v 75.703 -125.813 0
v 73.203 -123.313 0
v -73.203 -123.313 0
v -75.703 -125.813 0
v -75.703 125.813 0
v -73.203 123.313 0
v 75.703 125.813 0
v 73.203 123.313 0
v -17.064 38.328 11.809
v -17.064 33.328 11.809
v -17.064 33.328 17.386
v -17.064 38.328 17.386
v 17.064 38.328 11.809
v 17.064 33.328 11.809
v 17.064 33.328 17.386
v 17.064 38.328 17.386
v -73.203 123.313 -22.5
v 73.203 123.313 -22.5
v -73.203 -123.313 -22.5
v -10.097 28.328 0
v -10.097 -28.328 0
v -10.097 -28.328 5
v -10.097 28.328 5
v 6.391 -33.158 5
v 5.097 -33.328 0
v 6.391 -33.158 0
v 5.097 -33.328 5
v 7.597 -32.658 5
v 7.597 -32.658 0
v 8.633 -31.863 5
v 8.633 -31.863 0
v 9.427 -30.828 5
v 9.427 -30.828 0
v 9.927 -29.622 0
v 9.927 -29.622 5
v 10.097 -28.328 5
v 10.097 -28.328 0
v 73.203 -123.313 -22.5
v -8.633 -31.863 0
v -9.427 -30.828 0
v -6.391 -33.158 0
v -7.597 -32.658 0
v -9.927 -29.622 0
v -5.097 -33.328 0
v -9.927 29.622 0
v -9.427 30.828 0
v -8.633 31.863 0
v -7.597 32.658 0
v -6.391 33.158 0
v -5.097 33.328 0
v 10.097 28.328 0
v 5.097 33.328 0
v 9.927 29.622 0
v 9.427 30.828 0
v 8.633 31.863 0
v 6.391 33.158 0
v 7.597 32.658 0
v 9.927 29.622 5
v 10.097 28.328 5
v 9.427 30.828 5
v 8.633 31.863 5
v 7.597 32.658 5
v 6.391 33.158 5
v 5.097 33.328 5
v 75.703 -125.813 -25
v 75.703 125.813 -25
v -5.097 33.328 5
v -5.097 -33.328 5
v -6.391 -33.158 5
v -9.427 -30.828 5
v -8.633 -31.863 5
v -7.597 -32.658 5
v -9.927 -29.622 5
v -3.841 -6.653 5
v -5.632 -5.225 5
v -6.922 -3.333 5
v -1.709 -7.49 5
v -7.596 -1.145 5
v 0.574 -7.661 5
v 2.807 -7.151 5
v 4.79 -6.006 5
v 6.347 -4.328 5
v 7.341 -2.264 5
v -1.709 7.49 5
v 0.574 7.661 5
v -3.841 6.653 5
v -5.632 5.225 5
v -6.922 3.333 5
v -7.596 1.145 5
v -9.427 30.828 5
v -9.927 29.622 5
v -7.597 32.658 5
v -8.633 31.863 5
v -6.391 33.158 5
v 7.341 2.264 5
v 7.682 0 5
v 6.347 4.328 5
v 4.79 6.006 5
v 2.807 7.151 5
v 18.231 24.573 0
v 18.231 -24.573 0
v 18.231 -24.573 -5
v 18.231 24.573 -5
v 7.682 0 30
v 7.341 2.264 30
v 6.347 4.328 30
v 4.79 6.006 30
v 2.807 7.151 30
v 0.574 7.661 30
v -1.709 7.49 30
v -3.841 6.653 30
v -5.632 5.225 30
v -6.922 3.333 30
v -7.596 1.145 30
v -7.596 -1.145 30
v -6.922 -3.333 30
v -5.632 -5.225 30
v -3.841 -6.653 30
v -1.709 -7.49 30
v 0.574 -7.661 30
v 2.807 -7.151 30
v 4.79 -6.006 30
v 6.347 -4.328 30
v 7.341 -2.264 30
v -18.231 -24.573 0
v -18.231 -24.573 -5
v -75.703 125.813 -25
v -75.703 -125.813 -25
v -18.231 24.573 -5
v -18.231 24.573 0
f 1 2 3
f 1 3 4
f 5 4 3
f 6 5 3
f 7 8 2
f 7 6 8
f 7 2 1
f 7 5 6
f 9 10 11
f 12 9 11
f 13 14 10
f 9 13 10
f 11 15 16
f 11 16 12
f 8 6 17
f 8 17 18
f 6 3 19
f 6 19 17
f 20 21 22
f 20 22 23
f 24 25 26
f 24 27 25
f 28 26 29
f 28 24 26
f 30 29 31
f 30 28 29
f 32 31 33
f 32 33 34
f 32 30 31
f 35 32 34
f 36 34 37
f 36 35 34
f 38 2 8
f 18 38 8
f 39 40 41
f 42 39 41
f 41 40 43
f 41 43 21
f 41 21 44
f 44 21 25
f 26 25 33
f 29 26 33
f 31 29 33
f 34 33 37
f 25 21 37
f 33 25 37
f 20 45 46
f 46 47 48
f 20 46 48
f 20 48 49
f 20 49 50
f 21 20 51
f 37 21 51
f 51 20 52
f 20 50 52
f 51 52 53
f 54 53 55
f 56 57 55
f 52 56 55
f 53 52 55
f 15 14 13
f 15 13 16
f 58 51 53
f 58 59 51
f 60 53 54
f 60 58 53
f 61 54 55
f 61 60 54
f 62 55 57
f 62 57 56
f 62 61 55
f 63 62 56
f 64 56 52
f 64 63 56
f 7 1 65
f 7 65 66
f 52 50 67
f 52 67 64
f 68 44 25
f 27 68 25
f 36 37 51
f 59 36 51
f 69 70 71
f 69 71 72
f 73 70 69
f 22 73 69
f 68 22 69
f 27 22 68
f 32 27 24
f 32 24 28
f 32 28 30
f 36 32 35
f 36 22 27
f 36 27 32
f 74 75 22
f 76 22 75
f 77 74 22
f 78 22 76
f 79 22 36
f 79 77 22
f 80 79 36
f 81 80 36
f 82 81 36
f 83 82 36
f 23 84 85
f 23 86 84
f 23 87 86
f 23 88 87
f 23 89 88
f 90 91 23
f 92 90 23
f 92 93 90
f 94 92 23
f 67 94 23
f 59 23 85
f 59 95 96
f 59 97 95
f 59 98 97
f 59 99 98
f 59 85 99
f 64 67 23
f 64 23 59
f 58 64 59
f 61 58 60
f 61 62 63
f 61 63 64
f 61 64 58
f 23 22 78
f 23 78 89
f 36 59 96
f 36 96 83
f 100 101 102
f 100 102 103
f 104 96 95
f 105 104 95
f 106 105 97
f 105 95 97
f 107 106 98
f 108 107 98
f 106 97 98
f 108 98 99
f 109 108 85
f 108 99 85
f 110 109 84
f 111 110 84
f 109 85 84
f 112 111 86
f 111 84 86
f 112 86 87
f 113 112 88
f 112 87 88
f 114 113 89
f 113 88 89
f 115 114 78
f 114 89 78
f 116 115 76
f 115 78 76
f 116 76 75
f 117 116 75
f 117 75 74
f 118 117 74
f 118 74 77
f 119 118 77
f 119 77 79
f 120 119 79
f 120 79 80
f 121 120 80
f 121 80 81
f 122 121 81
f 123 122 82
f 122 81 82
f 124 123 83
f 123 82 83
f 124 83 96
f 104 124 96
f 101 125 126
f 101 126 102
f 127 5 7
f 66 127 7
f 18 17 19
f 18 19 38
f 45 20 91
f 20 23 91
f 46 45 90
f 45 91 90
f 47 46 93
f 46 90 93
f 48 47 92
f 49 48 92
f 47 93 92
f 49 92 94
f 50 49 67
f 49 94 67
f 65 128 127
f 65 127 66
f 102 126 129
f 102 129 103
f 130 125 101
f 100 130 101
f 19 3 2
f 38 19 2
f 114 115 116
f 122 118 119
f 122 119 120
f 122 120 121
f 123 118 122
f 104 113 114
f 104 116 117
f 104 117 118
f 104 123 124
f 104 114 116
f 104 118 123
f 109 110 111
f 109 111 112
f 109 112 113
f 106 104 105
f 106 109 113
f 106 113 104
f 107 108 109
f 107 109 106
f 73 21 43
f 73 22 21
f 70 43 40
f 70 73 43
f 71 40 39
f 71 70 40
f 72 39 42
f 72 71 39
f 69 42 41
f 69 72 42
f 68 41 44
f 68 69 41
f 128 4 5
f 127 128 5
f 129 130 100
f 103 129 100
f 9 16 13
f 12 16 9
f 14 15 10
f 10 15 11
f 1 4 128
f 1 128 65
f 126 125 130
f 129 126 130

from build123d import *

# Parameters (mm, degrees)
F0_W      = 36.4612303674
F0_H      = 49.1461269557
F1_DEPTH  = 5
F2_W      = 20.1943330467
F2_H      = 66.6557475924
F3_DEPTH  = 5
F4_R      = 5
F5_R      = 7.6822914086
F6_DEPTH  = 25
F7_W      = 34.1282226145
F7_H      = 5.577320233
F8_DEPTH  = 5
F9_W      = 151.4060050249
F9_H      = 251.6252994537
F10_DEPTH = 25
F11_T     = -2.5


with BuildPart() as f1:
    # F0 (on Top) → F1 (new body)
    with BuildSketch(Plane.XY):
        Rectangle(F0_W, F0_H)
    extrude(amount=-F1_DEPTH)


with BuildPart() as f3:
    # F2 (on face) → F3 (new body)
    with BuildSketch(Plane.XY):
        Rectangle(F2_W, F2_H)
    extrude(amount=F3_DEPTH)

    # F4
    f4_edges = [f3.edges().sort_by_distance(p)[0] for p in [
        (-10.097167, -33.327874, 2.5),
        (10.097167, -33.327874, 2.5),
        (10.097167, 33.327874, 2.5),
        (-10.097167, 33.327874, 2.5),
    ]]
    fillet(f4_edges, radius=F4_R)

    # F5 (on face) → F6 (join)
    with BuildSketch(Plane.XY.offset(5)):
        Circle(F5_R)
    extrude(amount=F6_DEPTH)


with BuildPart() as f8:
    # F7 (on face) → F8 (new body)
    with BuildSketch(Plane(origin=(0, 33.3278737962, 0), x_dir=(-1, 0, 0), z_dir=(0, 1, 0))):
        with Locations((0, 14.5977335051)):
            Rectangle(F7_W, F7_H)
    extrude(amount=F8_DEPTH)


with BuildPart() as f10:
    # F9 (on Top) → F10 (new body)
    with BuildSketch(Plane.XY):
        Rectangle(F9_W, F9_H)
    extrude(amount=-F10_DEPTH)

    # F11
    f11_openings = [f10.faces().sort_by_distance(p)[0] for p in [
        (0, 0, 0),
    ]]
    offset(amount=F11_T, openings=f11_openings)


solid = Compound([f1.part, f3.part, f8.part, f10.part])
